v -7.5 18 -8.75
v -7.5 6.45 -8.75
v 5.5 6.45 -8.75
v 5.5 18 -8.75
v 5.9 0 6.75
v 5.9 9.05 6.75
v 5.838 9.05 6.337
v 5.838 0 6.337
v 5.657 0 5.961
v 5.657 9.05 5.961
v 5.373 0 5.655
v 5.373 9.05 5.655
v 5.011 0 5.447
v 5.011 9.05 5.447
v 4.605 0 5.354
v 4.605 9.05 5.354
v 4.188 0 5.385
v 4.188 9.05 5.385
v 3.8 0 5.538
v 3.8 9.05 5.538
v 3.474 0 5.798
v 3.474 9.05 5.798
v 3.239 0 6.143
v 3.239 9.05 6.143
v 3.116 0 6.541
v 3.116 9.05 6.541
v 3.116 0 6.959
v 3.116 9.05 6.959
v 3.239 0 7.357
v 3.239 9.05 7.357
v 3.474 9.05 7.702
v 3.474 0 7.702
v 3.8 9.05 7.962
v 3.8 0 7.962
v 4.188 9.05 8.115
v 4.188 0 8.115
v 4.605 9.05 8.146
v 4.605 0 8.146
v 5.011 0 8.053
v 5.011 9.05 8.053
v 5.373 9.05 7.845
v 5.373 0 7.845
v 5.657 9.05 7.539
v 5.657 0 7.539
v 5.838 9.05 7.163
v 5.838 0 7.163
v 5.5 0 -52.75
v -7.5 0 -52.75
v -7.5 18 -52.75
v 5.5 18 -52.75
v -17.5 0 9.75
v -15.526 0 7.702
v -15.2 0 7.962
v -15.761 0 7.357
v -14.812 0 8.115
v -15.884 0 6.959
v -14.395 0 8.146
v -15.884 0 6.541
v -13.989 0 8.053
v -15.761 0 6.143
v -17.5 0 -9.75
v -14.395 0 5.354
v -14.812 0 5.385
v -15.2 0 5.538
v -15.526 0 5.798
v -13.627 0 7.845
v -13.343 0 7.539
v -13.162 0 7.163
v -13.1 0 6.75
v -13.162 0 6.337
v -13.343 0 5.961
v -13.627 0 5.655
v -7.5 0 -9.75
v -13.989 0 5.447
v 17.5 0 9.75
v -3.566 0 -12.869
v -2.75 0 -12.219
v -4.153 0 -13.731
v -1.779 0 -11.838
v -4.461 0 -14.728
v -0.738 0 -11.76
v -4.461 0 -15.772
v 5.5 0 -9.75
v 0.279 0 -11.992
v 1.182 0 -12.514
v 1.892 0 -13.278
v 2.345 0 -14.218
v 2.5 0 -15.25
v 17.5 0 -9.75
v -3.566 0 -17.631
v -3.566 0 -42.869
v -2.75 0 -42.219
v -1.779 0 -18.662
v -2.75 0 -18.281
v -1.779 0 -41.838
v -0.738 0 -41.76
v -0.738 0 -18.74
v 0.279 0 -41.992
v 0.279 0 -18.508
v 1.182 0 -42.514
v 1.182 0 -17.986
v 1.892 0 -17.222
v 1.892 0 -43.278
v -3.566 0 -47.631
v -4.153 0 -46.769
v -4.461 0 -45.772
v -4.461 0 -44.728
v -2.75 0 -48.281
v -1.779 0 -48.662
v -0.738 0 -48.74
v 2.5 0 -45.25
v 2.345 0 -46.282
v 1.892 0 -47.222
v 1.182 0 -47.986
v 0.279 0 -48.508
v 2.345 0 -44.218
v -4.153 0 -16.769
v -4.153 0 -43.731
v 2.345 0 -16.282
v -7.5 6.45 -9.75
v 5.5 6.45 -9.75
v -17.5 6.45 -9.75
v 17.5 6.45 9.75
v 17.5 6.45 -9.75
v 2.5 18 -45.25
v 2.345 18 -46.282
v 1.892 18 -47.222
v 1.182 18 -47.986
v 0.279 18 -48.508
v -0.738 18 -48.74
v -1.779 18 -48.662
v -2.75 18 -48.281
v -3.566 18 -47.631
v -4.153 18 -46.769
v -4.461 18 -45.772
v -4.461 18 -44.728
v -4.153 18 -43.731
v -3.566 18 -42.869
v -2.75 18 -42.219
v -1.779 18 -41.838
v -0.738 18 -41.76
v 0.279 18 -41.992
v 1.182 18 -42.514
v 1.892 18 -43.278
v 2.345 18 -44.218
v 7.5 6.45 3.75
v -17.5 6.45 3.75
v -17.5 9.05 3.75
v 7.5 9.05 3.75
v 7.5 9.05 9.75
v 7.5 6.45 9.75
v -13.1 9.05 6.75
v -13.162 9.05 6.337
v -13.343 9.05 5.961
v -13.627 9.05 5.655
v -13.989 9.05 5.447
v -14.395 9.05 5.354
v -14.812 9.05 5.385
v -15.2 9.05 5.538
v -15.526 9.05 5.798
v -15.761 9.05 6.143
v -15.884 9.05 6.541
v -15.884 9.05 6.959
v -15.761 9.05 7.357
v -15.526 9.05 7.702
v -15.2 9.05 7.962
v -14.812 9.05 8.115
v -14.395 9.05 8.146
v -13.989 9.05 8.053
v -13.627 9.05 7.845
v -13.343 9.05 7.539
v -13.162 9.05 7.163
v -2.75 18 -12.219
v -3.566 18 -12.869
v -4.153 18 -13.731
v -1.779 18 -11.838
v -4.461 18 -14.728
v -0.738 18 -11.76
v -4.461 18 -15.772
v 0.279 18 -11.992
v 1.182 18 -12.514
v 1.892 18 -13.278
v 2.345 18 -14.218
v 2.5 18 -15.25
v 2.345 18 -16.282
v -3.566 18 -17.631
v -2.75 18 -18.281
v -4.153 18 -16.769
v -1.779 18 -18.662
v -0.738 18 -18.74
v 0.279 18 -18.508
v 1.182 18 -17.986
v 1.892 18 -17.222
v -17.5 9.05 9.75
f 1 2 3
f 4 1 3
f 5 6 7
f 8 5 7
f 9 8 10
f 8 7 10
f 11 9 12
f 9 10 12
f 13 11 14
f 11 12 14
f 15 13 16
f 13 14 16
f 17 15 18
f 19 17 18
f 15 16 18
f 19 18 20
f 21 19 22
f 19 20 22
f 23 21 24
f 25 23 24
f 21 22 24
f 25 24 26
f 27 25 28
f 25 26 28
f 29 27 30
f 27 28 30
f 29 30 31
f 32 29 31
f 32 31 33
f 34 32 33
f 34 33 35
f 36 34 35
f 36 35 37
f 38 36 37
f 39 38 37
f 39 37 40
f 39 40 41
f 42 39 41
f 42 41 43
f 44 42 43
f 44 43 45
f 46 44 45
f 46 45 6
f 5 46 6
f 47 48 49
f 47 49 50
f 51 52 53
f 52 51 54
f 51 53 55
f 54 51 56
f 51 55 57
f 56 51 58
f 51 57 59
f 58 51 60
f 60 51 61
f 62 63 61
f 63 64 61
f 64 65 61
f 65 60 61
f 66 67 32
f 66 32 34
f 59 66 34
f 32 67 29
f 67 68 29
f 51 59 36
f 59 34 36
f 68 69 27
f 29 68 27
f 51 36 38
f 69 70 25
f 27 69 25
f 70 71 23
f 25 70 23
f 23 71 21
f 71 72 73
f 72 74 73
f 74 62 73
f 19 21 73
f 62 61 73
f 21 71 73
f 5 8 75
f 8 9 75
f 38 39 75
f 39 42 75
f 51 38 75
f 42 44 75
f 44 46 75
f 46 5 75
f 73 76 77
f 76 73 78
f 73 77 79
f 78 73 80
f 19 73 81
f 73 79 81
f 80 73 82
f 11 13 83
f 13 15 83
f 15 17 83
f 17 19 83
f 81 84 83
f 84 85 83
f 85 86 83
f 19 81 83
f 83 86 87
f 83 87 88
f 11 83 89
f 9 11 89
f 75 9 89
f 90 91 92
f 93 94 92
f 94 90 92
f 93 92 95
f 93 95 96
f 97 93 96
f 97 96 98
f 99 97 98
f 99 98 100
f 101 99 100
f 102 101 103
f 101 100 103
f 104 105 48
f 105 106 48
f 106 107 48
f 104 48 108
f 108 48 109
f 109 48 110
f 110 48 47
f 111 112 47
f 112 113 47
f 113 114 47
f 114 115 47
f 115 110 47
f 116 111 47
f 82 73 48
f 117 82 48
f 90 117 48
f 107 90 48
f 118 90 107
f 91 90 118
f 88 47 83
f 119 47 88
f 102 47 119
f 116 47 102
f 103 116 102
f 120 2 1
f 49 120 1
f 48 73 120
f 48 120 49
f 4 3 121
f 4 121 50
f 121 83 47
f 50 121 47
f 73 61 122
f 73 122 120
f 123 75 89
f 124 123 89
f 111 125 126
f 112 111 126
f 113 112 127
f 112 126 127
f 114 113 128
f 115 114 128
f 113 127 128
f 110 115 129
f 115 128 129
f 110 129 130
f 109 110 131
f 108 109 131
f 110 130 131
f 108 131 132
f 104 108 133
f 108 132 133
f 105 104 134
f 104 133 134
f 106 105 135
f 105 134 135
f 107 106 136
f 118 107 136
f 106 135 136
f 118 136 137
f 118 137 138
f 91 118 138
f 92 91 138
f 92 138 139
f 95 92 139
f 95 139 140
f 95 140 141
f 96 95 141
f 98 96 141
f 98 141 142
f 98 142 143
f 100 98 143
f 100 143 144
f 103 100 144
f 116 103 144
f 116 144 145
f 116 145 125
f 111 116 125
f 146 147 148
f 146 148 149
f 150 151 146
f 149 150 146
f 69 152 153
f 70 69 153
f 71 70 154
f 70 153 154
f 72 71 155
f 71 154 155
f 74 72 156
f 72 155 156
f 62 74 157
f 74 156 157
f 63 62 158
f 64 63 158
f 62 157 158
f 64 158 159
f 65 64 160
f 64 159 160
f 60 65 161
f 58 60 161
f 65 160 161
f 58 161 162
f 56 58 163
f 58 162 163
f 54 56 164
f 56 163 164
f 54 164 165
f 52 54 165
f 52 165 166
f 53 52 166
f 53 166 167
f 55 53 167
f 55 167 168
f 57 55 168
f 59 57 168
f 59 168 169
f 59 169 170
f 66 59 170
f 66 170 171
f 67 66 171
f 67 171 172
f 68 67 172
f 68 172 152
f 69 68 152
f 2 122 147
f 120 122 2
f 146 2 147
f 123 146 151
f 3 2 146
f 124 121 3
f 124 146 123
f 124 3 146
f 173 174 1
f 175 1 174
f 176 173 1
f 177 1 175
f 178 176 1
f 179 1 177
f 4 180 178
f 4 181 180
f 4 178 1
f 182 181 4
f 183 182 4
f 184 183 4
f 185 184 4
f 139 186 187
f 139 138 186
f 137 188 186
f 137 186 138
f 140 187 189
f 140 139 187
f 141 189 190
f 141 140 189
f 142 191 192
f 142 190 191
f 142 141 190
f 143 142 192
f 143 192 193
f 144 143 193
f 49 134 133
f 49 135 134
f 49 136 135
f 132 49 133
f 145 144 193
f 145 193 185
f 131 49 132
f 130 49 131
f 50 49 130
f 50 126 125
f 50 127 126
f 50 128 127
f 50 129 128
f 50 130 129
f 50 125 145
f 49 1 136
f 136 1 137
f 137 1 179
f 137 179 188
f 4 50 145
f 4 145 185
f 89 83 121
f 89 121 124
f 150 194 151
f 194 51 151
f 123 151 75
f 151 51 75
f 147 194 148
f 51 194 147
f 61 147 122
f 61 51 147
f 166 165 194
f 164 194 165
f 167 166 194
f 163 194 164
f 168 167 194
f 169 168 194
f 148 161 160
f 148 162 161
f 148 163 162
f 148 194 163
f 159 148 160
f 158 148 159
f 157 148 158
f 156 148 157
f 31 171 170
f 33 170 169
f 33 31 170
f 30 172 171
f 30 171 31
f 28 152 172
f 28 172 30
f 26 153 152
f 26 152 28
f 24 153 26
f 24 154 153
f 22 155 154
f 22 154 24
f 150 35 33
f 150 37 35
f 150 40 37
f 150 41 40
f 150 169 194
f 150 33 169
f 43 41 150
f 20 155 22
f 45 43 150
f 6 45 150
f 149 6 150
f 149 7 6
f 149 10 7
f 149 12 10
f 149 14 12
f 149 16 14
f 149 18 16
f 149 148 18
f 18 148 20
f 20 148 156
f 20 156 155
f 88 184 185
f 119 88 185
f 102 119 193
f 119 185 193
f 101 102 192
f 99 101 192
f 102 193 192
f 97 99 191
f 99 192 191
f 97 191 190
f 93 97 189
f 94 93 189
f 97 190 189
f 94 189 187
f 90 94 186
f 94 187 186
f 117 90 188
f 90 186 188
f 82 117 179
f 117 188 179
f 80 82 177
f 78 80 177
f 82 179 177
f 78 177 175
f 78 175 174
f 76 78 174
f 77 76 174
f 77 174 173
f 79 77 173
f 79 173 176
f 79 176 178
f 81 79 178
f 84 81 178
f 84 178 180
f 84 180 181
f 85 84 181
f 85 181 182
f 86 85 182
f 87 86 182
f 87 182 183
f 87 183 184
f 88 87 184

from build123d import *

# Parameters (mm, degrees)
SKETCH1_W           = 35
SKETCH1_H           = 19.5
BOSS_EXTRUDE1_DEPTH = 6.45
SKETCH2_W           = 13
SKETCH2_H           = 44
BOSS_EXTRUDE2_DEPTH = 18
SKETCH3_R           = 3.5
CUT_EXTRUDE1_DEPTH  = 19
SKETCH4_W           = 25
SKETCH4_H           = 6
BOSS_EXTRUDE3_DEPTH = 2.6
SKETCH5_R           = 1.4
CUT_EXTRUDE2_DEPTH  = 10.05


with BuildPart() as part:
    # Sketch1 → Boss-Extrude1 (new body)
    with BuildSketch(Plane(origin=(0, 0, 0), x_dir=(1, 0, 0), z_dir=(0, 1, 0))):
        Rectangle(SKETCH1_W, SKETCH1_H)
    extrude(amount=BOSS_EXTRUDE1_DEPTH)

    # Sketch2 → Boss-Extrude2 (add)
    with BuildSketch(Plane(origin=(0, 0, 0), x_dir=(1, 0, 0), z_dir=(0, 1, 0))):
        with Locations((-1, 30.75)):
            Rectangle(SKETCH2_W, SKETCH2_H)
    extrude(amount=BOSS_EXTRUDE2_DEPTH)

    # Sketch3 → Cut-Extrude1 (cut, through all)
    with BuildSketch(Plane(origin=(0, 18, 0), x_dir=(1, 0, 0), z_dir=(0, 1, 0))):
        with Locations((-1, 45.25)):
            Circle(SKETCH3_R)
        with Locations((-1, 15.25)):
            Circle(SKETCH3_R)
    extrude(amount=-CUT_EXTRUDE1_DEPTH, mode=Mode.SUBTRACT)

    # Sketch4 → Boss-Extrude3 (add)
    with BuildSketch(Plane(origin=(0, 6.45, 0), x_dir=(1, 0, 0), z_dir=(0, 1, 0))):
        with Locations((-5, -6.75)):
            Rectangle(SKETCH4_W, SKETCH4_H)
    extrude(amount=BOSS_EXTRUDE3_DEPTH)

    # Sketch5 → Cut-Extrude2 (cut, through all)
    with BuildSketch(Plane(origin=(0, 9.05, 0), x_dir=(1, 0, 0), z_dir=(0, 1, 0))):
        with Locations((-14.5, -6.75)):
            Circle(SKETCH5_R)
        with Locations((4.5, -6.75)):
            Circle(SKETCH5_R)
    extrude(amount=-CUT_EXTRUDE2_DEPTH, mode=Mode.SUBTRACT)


solid = part.part
